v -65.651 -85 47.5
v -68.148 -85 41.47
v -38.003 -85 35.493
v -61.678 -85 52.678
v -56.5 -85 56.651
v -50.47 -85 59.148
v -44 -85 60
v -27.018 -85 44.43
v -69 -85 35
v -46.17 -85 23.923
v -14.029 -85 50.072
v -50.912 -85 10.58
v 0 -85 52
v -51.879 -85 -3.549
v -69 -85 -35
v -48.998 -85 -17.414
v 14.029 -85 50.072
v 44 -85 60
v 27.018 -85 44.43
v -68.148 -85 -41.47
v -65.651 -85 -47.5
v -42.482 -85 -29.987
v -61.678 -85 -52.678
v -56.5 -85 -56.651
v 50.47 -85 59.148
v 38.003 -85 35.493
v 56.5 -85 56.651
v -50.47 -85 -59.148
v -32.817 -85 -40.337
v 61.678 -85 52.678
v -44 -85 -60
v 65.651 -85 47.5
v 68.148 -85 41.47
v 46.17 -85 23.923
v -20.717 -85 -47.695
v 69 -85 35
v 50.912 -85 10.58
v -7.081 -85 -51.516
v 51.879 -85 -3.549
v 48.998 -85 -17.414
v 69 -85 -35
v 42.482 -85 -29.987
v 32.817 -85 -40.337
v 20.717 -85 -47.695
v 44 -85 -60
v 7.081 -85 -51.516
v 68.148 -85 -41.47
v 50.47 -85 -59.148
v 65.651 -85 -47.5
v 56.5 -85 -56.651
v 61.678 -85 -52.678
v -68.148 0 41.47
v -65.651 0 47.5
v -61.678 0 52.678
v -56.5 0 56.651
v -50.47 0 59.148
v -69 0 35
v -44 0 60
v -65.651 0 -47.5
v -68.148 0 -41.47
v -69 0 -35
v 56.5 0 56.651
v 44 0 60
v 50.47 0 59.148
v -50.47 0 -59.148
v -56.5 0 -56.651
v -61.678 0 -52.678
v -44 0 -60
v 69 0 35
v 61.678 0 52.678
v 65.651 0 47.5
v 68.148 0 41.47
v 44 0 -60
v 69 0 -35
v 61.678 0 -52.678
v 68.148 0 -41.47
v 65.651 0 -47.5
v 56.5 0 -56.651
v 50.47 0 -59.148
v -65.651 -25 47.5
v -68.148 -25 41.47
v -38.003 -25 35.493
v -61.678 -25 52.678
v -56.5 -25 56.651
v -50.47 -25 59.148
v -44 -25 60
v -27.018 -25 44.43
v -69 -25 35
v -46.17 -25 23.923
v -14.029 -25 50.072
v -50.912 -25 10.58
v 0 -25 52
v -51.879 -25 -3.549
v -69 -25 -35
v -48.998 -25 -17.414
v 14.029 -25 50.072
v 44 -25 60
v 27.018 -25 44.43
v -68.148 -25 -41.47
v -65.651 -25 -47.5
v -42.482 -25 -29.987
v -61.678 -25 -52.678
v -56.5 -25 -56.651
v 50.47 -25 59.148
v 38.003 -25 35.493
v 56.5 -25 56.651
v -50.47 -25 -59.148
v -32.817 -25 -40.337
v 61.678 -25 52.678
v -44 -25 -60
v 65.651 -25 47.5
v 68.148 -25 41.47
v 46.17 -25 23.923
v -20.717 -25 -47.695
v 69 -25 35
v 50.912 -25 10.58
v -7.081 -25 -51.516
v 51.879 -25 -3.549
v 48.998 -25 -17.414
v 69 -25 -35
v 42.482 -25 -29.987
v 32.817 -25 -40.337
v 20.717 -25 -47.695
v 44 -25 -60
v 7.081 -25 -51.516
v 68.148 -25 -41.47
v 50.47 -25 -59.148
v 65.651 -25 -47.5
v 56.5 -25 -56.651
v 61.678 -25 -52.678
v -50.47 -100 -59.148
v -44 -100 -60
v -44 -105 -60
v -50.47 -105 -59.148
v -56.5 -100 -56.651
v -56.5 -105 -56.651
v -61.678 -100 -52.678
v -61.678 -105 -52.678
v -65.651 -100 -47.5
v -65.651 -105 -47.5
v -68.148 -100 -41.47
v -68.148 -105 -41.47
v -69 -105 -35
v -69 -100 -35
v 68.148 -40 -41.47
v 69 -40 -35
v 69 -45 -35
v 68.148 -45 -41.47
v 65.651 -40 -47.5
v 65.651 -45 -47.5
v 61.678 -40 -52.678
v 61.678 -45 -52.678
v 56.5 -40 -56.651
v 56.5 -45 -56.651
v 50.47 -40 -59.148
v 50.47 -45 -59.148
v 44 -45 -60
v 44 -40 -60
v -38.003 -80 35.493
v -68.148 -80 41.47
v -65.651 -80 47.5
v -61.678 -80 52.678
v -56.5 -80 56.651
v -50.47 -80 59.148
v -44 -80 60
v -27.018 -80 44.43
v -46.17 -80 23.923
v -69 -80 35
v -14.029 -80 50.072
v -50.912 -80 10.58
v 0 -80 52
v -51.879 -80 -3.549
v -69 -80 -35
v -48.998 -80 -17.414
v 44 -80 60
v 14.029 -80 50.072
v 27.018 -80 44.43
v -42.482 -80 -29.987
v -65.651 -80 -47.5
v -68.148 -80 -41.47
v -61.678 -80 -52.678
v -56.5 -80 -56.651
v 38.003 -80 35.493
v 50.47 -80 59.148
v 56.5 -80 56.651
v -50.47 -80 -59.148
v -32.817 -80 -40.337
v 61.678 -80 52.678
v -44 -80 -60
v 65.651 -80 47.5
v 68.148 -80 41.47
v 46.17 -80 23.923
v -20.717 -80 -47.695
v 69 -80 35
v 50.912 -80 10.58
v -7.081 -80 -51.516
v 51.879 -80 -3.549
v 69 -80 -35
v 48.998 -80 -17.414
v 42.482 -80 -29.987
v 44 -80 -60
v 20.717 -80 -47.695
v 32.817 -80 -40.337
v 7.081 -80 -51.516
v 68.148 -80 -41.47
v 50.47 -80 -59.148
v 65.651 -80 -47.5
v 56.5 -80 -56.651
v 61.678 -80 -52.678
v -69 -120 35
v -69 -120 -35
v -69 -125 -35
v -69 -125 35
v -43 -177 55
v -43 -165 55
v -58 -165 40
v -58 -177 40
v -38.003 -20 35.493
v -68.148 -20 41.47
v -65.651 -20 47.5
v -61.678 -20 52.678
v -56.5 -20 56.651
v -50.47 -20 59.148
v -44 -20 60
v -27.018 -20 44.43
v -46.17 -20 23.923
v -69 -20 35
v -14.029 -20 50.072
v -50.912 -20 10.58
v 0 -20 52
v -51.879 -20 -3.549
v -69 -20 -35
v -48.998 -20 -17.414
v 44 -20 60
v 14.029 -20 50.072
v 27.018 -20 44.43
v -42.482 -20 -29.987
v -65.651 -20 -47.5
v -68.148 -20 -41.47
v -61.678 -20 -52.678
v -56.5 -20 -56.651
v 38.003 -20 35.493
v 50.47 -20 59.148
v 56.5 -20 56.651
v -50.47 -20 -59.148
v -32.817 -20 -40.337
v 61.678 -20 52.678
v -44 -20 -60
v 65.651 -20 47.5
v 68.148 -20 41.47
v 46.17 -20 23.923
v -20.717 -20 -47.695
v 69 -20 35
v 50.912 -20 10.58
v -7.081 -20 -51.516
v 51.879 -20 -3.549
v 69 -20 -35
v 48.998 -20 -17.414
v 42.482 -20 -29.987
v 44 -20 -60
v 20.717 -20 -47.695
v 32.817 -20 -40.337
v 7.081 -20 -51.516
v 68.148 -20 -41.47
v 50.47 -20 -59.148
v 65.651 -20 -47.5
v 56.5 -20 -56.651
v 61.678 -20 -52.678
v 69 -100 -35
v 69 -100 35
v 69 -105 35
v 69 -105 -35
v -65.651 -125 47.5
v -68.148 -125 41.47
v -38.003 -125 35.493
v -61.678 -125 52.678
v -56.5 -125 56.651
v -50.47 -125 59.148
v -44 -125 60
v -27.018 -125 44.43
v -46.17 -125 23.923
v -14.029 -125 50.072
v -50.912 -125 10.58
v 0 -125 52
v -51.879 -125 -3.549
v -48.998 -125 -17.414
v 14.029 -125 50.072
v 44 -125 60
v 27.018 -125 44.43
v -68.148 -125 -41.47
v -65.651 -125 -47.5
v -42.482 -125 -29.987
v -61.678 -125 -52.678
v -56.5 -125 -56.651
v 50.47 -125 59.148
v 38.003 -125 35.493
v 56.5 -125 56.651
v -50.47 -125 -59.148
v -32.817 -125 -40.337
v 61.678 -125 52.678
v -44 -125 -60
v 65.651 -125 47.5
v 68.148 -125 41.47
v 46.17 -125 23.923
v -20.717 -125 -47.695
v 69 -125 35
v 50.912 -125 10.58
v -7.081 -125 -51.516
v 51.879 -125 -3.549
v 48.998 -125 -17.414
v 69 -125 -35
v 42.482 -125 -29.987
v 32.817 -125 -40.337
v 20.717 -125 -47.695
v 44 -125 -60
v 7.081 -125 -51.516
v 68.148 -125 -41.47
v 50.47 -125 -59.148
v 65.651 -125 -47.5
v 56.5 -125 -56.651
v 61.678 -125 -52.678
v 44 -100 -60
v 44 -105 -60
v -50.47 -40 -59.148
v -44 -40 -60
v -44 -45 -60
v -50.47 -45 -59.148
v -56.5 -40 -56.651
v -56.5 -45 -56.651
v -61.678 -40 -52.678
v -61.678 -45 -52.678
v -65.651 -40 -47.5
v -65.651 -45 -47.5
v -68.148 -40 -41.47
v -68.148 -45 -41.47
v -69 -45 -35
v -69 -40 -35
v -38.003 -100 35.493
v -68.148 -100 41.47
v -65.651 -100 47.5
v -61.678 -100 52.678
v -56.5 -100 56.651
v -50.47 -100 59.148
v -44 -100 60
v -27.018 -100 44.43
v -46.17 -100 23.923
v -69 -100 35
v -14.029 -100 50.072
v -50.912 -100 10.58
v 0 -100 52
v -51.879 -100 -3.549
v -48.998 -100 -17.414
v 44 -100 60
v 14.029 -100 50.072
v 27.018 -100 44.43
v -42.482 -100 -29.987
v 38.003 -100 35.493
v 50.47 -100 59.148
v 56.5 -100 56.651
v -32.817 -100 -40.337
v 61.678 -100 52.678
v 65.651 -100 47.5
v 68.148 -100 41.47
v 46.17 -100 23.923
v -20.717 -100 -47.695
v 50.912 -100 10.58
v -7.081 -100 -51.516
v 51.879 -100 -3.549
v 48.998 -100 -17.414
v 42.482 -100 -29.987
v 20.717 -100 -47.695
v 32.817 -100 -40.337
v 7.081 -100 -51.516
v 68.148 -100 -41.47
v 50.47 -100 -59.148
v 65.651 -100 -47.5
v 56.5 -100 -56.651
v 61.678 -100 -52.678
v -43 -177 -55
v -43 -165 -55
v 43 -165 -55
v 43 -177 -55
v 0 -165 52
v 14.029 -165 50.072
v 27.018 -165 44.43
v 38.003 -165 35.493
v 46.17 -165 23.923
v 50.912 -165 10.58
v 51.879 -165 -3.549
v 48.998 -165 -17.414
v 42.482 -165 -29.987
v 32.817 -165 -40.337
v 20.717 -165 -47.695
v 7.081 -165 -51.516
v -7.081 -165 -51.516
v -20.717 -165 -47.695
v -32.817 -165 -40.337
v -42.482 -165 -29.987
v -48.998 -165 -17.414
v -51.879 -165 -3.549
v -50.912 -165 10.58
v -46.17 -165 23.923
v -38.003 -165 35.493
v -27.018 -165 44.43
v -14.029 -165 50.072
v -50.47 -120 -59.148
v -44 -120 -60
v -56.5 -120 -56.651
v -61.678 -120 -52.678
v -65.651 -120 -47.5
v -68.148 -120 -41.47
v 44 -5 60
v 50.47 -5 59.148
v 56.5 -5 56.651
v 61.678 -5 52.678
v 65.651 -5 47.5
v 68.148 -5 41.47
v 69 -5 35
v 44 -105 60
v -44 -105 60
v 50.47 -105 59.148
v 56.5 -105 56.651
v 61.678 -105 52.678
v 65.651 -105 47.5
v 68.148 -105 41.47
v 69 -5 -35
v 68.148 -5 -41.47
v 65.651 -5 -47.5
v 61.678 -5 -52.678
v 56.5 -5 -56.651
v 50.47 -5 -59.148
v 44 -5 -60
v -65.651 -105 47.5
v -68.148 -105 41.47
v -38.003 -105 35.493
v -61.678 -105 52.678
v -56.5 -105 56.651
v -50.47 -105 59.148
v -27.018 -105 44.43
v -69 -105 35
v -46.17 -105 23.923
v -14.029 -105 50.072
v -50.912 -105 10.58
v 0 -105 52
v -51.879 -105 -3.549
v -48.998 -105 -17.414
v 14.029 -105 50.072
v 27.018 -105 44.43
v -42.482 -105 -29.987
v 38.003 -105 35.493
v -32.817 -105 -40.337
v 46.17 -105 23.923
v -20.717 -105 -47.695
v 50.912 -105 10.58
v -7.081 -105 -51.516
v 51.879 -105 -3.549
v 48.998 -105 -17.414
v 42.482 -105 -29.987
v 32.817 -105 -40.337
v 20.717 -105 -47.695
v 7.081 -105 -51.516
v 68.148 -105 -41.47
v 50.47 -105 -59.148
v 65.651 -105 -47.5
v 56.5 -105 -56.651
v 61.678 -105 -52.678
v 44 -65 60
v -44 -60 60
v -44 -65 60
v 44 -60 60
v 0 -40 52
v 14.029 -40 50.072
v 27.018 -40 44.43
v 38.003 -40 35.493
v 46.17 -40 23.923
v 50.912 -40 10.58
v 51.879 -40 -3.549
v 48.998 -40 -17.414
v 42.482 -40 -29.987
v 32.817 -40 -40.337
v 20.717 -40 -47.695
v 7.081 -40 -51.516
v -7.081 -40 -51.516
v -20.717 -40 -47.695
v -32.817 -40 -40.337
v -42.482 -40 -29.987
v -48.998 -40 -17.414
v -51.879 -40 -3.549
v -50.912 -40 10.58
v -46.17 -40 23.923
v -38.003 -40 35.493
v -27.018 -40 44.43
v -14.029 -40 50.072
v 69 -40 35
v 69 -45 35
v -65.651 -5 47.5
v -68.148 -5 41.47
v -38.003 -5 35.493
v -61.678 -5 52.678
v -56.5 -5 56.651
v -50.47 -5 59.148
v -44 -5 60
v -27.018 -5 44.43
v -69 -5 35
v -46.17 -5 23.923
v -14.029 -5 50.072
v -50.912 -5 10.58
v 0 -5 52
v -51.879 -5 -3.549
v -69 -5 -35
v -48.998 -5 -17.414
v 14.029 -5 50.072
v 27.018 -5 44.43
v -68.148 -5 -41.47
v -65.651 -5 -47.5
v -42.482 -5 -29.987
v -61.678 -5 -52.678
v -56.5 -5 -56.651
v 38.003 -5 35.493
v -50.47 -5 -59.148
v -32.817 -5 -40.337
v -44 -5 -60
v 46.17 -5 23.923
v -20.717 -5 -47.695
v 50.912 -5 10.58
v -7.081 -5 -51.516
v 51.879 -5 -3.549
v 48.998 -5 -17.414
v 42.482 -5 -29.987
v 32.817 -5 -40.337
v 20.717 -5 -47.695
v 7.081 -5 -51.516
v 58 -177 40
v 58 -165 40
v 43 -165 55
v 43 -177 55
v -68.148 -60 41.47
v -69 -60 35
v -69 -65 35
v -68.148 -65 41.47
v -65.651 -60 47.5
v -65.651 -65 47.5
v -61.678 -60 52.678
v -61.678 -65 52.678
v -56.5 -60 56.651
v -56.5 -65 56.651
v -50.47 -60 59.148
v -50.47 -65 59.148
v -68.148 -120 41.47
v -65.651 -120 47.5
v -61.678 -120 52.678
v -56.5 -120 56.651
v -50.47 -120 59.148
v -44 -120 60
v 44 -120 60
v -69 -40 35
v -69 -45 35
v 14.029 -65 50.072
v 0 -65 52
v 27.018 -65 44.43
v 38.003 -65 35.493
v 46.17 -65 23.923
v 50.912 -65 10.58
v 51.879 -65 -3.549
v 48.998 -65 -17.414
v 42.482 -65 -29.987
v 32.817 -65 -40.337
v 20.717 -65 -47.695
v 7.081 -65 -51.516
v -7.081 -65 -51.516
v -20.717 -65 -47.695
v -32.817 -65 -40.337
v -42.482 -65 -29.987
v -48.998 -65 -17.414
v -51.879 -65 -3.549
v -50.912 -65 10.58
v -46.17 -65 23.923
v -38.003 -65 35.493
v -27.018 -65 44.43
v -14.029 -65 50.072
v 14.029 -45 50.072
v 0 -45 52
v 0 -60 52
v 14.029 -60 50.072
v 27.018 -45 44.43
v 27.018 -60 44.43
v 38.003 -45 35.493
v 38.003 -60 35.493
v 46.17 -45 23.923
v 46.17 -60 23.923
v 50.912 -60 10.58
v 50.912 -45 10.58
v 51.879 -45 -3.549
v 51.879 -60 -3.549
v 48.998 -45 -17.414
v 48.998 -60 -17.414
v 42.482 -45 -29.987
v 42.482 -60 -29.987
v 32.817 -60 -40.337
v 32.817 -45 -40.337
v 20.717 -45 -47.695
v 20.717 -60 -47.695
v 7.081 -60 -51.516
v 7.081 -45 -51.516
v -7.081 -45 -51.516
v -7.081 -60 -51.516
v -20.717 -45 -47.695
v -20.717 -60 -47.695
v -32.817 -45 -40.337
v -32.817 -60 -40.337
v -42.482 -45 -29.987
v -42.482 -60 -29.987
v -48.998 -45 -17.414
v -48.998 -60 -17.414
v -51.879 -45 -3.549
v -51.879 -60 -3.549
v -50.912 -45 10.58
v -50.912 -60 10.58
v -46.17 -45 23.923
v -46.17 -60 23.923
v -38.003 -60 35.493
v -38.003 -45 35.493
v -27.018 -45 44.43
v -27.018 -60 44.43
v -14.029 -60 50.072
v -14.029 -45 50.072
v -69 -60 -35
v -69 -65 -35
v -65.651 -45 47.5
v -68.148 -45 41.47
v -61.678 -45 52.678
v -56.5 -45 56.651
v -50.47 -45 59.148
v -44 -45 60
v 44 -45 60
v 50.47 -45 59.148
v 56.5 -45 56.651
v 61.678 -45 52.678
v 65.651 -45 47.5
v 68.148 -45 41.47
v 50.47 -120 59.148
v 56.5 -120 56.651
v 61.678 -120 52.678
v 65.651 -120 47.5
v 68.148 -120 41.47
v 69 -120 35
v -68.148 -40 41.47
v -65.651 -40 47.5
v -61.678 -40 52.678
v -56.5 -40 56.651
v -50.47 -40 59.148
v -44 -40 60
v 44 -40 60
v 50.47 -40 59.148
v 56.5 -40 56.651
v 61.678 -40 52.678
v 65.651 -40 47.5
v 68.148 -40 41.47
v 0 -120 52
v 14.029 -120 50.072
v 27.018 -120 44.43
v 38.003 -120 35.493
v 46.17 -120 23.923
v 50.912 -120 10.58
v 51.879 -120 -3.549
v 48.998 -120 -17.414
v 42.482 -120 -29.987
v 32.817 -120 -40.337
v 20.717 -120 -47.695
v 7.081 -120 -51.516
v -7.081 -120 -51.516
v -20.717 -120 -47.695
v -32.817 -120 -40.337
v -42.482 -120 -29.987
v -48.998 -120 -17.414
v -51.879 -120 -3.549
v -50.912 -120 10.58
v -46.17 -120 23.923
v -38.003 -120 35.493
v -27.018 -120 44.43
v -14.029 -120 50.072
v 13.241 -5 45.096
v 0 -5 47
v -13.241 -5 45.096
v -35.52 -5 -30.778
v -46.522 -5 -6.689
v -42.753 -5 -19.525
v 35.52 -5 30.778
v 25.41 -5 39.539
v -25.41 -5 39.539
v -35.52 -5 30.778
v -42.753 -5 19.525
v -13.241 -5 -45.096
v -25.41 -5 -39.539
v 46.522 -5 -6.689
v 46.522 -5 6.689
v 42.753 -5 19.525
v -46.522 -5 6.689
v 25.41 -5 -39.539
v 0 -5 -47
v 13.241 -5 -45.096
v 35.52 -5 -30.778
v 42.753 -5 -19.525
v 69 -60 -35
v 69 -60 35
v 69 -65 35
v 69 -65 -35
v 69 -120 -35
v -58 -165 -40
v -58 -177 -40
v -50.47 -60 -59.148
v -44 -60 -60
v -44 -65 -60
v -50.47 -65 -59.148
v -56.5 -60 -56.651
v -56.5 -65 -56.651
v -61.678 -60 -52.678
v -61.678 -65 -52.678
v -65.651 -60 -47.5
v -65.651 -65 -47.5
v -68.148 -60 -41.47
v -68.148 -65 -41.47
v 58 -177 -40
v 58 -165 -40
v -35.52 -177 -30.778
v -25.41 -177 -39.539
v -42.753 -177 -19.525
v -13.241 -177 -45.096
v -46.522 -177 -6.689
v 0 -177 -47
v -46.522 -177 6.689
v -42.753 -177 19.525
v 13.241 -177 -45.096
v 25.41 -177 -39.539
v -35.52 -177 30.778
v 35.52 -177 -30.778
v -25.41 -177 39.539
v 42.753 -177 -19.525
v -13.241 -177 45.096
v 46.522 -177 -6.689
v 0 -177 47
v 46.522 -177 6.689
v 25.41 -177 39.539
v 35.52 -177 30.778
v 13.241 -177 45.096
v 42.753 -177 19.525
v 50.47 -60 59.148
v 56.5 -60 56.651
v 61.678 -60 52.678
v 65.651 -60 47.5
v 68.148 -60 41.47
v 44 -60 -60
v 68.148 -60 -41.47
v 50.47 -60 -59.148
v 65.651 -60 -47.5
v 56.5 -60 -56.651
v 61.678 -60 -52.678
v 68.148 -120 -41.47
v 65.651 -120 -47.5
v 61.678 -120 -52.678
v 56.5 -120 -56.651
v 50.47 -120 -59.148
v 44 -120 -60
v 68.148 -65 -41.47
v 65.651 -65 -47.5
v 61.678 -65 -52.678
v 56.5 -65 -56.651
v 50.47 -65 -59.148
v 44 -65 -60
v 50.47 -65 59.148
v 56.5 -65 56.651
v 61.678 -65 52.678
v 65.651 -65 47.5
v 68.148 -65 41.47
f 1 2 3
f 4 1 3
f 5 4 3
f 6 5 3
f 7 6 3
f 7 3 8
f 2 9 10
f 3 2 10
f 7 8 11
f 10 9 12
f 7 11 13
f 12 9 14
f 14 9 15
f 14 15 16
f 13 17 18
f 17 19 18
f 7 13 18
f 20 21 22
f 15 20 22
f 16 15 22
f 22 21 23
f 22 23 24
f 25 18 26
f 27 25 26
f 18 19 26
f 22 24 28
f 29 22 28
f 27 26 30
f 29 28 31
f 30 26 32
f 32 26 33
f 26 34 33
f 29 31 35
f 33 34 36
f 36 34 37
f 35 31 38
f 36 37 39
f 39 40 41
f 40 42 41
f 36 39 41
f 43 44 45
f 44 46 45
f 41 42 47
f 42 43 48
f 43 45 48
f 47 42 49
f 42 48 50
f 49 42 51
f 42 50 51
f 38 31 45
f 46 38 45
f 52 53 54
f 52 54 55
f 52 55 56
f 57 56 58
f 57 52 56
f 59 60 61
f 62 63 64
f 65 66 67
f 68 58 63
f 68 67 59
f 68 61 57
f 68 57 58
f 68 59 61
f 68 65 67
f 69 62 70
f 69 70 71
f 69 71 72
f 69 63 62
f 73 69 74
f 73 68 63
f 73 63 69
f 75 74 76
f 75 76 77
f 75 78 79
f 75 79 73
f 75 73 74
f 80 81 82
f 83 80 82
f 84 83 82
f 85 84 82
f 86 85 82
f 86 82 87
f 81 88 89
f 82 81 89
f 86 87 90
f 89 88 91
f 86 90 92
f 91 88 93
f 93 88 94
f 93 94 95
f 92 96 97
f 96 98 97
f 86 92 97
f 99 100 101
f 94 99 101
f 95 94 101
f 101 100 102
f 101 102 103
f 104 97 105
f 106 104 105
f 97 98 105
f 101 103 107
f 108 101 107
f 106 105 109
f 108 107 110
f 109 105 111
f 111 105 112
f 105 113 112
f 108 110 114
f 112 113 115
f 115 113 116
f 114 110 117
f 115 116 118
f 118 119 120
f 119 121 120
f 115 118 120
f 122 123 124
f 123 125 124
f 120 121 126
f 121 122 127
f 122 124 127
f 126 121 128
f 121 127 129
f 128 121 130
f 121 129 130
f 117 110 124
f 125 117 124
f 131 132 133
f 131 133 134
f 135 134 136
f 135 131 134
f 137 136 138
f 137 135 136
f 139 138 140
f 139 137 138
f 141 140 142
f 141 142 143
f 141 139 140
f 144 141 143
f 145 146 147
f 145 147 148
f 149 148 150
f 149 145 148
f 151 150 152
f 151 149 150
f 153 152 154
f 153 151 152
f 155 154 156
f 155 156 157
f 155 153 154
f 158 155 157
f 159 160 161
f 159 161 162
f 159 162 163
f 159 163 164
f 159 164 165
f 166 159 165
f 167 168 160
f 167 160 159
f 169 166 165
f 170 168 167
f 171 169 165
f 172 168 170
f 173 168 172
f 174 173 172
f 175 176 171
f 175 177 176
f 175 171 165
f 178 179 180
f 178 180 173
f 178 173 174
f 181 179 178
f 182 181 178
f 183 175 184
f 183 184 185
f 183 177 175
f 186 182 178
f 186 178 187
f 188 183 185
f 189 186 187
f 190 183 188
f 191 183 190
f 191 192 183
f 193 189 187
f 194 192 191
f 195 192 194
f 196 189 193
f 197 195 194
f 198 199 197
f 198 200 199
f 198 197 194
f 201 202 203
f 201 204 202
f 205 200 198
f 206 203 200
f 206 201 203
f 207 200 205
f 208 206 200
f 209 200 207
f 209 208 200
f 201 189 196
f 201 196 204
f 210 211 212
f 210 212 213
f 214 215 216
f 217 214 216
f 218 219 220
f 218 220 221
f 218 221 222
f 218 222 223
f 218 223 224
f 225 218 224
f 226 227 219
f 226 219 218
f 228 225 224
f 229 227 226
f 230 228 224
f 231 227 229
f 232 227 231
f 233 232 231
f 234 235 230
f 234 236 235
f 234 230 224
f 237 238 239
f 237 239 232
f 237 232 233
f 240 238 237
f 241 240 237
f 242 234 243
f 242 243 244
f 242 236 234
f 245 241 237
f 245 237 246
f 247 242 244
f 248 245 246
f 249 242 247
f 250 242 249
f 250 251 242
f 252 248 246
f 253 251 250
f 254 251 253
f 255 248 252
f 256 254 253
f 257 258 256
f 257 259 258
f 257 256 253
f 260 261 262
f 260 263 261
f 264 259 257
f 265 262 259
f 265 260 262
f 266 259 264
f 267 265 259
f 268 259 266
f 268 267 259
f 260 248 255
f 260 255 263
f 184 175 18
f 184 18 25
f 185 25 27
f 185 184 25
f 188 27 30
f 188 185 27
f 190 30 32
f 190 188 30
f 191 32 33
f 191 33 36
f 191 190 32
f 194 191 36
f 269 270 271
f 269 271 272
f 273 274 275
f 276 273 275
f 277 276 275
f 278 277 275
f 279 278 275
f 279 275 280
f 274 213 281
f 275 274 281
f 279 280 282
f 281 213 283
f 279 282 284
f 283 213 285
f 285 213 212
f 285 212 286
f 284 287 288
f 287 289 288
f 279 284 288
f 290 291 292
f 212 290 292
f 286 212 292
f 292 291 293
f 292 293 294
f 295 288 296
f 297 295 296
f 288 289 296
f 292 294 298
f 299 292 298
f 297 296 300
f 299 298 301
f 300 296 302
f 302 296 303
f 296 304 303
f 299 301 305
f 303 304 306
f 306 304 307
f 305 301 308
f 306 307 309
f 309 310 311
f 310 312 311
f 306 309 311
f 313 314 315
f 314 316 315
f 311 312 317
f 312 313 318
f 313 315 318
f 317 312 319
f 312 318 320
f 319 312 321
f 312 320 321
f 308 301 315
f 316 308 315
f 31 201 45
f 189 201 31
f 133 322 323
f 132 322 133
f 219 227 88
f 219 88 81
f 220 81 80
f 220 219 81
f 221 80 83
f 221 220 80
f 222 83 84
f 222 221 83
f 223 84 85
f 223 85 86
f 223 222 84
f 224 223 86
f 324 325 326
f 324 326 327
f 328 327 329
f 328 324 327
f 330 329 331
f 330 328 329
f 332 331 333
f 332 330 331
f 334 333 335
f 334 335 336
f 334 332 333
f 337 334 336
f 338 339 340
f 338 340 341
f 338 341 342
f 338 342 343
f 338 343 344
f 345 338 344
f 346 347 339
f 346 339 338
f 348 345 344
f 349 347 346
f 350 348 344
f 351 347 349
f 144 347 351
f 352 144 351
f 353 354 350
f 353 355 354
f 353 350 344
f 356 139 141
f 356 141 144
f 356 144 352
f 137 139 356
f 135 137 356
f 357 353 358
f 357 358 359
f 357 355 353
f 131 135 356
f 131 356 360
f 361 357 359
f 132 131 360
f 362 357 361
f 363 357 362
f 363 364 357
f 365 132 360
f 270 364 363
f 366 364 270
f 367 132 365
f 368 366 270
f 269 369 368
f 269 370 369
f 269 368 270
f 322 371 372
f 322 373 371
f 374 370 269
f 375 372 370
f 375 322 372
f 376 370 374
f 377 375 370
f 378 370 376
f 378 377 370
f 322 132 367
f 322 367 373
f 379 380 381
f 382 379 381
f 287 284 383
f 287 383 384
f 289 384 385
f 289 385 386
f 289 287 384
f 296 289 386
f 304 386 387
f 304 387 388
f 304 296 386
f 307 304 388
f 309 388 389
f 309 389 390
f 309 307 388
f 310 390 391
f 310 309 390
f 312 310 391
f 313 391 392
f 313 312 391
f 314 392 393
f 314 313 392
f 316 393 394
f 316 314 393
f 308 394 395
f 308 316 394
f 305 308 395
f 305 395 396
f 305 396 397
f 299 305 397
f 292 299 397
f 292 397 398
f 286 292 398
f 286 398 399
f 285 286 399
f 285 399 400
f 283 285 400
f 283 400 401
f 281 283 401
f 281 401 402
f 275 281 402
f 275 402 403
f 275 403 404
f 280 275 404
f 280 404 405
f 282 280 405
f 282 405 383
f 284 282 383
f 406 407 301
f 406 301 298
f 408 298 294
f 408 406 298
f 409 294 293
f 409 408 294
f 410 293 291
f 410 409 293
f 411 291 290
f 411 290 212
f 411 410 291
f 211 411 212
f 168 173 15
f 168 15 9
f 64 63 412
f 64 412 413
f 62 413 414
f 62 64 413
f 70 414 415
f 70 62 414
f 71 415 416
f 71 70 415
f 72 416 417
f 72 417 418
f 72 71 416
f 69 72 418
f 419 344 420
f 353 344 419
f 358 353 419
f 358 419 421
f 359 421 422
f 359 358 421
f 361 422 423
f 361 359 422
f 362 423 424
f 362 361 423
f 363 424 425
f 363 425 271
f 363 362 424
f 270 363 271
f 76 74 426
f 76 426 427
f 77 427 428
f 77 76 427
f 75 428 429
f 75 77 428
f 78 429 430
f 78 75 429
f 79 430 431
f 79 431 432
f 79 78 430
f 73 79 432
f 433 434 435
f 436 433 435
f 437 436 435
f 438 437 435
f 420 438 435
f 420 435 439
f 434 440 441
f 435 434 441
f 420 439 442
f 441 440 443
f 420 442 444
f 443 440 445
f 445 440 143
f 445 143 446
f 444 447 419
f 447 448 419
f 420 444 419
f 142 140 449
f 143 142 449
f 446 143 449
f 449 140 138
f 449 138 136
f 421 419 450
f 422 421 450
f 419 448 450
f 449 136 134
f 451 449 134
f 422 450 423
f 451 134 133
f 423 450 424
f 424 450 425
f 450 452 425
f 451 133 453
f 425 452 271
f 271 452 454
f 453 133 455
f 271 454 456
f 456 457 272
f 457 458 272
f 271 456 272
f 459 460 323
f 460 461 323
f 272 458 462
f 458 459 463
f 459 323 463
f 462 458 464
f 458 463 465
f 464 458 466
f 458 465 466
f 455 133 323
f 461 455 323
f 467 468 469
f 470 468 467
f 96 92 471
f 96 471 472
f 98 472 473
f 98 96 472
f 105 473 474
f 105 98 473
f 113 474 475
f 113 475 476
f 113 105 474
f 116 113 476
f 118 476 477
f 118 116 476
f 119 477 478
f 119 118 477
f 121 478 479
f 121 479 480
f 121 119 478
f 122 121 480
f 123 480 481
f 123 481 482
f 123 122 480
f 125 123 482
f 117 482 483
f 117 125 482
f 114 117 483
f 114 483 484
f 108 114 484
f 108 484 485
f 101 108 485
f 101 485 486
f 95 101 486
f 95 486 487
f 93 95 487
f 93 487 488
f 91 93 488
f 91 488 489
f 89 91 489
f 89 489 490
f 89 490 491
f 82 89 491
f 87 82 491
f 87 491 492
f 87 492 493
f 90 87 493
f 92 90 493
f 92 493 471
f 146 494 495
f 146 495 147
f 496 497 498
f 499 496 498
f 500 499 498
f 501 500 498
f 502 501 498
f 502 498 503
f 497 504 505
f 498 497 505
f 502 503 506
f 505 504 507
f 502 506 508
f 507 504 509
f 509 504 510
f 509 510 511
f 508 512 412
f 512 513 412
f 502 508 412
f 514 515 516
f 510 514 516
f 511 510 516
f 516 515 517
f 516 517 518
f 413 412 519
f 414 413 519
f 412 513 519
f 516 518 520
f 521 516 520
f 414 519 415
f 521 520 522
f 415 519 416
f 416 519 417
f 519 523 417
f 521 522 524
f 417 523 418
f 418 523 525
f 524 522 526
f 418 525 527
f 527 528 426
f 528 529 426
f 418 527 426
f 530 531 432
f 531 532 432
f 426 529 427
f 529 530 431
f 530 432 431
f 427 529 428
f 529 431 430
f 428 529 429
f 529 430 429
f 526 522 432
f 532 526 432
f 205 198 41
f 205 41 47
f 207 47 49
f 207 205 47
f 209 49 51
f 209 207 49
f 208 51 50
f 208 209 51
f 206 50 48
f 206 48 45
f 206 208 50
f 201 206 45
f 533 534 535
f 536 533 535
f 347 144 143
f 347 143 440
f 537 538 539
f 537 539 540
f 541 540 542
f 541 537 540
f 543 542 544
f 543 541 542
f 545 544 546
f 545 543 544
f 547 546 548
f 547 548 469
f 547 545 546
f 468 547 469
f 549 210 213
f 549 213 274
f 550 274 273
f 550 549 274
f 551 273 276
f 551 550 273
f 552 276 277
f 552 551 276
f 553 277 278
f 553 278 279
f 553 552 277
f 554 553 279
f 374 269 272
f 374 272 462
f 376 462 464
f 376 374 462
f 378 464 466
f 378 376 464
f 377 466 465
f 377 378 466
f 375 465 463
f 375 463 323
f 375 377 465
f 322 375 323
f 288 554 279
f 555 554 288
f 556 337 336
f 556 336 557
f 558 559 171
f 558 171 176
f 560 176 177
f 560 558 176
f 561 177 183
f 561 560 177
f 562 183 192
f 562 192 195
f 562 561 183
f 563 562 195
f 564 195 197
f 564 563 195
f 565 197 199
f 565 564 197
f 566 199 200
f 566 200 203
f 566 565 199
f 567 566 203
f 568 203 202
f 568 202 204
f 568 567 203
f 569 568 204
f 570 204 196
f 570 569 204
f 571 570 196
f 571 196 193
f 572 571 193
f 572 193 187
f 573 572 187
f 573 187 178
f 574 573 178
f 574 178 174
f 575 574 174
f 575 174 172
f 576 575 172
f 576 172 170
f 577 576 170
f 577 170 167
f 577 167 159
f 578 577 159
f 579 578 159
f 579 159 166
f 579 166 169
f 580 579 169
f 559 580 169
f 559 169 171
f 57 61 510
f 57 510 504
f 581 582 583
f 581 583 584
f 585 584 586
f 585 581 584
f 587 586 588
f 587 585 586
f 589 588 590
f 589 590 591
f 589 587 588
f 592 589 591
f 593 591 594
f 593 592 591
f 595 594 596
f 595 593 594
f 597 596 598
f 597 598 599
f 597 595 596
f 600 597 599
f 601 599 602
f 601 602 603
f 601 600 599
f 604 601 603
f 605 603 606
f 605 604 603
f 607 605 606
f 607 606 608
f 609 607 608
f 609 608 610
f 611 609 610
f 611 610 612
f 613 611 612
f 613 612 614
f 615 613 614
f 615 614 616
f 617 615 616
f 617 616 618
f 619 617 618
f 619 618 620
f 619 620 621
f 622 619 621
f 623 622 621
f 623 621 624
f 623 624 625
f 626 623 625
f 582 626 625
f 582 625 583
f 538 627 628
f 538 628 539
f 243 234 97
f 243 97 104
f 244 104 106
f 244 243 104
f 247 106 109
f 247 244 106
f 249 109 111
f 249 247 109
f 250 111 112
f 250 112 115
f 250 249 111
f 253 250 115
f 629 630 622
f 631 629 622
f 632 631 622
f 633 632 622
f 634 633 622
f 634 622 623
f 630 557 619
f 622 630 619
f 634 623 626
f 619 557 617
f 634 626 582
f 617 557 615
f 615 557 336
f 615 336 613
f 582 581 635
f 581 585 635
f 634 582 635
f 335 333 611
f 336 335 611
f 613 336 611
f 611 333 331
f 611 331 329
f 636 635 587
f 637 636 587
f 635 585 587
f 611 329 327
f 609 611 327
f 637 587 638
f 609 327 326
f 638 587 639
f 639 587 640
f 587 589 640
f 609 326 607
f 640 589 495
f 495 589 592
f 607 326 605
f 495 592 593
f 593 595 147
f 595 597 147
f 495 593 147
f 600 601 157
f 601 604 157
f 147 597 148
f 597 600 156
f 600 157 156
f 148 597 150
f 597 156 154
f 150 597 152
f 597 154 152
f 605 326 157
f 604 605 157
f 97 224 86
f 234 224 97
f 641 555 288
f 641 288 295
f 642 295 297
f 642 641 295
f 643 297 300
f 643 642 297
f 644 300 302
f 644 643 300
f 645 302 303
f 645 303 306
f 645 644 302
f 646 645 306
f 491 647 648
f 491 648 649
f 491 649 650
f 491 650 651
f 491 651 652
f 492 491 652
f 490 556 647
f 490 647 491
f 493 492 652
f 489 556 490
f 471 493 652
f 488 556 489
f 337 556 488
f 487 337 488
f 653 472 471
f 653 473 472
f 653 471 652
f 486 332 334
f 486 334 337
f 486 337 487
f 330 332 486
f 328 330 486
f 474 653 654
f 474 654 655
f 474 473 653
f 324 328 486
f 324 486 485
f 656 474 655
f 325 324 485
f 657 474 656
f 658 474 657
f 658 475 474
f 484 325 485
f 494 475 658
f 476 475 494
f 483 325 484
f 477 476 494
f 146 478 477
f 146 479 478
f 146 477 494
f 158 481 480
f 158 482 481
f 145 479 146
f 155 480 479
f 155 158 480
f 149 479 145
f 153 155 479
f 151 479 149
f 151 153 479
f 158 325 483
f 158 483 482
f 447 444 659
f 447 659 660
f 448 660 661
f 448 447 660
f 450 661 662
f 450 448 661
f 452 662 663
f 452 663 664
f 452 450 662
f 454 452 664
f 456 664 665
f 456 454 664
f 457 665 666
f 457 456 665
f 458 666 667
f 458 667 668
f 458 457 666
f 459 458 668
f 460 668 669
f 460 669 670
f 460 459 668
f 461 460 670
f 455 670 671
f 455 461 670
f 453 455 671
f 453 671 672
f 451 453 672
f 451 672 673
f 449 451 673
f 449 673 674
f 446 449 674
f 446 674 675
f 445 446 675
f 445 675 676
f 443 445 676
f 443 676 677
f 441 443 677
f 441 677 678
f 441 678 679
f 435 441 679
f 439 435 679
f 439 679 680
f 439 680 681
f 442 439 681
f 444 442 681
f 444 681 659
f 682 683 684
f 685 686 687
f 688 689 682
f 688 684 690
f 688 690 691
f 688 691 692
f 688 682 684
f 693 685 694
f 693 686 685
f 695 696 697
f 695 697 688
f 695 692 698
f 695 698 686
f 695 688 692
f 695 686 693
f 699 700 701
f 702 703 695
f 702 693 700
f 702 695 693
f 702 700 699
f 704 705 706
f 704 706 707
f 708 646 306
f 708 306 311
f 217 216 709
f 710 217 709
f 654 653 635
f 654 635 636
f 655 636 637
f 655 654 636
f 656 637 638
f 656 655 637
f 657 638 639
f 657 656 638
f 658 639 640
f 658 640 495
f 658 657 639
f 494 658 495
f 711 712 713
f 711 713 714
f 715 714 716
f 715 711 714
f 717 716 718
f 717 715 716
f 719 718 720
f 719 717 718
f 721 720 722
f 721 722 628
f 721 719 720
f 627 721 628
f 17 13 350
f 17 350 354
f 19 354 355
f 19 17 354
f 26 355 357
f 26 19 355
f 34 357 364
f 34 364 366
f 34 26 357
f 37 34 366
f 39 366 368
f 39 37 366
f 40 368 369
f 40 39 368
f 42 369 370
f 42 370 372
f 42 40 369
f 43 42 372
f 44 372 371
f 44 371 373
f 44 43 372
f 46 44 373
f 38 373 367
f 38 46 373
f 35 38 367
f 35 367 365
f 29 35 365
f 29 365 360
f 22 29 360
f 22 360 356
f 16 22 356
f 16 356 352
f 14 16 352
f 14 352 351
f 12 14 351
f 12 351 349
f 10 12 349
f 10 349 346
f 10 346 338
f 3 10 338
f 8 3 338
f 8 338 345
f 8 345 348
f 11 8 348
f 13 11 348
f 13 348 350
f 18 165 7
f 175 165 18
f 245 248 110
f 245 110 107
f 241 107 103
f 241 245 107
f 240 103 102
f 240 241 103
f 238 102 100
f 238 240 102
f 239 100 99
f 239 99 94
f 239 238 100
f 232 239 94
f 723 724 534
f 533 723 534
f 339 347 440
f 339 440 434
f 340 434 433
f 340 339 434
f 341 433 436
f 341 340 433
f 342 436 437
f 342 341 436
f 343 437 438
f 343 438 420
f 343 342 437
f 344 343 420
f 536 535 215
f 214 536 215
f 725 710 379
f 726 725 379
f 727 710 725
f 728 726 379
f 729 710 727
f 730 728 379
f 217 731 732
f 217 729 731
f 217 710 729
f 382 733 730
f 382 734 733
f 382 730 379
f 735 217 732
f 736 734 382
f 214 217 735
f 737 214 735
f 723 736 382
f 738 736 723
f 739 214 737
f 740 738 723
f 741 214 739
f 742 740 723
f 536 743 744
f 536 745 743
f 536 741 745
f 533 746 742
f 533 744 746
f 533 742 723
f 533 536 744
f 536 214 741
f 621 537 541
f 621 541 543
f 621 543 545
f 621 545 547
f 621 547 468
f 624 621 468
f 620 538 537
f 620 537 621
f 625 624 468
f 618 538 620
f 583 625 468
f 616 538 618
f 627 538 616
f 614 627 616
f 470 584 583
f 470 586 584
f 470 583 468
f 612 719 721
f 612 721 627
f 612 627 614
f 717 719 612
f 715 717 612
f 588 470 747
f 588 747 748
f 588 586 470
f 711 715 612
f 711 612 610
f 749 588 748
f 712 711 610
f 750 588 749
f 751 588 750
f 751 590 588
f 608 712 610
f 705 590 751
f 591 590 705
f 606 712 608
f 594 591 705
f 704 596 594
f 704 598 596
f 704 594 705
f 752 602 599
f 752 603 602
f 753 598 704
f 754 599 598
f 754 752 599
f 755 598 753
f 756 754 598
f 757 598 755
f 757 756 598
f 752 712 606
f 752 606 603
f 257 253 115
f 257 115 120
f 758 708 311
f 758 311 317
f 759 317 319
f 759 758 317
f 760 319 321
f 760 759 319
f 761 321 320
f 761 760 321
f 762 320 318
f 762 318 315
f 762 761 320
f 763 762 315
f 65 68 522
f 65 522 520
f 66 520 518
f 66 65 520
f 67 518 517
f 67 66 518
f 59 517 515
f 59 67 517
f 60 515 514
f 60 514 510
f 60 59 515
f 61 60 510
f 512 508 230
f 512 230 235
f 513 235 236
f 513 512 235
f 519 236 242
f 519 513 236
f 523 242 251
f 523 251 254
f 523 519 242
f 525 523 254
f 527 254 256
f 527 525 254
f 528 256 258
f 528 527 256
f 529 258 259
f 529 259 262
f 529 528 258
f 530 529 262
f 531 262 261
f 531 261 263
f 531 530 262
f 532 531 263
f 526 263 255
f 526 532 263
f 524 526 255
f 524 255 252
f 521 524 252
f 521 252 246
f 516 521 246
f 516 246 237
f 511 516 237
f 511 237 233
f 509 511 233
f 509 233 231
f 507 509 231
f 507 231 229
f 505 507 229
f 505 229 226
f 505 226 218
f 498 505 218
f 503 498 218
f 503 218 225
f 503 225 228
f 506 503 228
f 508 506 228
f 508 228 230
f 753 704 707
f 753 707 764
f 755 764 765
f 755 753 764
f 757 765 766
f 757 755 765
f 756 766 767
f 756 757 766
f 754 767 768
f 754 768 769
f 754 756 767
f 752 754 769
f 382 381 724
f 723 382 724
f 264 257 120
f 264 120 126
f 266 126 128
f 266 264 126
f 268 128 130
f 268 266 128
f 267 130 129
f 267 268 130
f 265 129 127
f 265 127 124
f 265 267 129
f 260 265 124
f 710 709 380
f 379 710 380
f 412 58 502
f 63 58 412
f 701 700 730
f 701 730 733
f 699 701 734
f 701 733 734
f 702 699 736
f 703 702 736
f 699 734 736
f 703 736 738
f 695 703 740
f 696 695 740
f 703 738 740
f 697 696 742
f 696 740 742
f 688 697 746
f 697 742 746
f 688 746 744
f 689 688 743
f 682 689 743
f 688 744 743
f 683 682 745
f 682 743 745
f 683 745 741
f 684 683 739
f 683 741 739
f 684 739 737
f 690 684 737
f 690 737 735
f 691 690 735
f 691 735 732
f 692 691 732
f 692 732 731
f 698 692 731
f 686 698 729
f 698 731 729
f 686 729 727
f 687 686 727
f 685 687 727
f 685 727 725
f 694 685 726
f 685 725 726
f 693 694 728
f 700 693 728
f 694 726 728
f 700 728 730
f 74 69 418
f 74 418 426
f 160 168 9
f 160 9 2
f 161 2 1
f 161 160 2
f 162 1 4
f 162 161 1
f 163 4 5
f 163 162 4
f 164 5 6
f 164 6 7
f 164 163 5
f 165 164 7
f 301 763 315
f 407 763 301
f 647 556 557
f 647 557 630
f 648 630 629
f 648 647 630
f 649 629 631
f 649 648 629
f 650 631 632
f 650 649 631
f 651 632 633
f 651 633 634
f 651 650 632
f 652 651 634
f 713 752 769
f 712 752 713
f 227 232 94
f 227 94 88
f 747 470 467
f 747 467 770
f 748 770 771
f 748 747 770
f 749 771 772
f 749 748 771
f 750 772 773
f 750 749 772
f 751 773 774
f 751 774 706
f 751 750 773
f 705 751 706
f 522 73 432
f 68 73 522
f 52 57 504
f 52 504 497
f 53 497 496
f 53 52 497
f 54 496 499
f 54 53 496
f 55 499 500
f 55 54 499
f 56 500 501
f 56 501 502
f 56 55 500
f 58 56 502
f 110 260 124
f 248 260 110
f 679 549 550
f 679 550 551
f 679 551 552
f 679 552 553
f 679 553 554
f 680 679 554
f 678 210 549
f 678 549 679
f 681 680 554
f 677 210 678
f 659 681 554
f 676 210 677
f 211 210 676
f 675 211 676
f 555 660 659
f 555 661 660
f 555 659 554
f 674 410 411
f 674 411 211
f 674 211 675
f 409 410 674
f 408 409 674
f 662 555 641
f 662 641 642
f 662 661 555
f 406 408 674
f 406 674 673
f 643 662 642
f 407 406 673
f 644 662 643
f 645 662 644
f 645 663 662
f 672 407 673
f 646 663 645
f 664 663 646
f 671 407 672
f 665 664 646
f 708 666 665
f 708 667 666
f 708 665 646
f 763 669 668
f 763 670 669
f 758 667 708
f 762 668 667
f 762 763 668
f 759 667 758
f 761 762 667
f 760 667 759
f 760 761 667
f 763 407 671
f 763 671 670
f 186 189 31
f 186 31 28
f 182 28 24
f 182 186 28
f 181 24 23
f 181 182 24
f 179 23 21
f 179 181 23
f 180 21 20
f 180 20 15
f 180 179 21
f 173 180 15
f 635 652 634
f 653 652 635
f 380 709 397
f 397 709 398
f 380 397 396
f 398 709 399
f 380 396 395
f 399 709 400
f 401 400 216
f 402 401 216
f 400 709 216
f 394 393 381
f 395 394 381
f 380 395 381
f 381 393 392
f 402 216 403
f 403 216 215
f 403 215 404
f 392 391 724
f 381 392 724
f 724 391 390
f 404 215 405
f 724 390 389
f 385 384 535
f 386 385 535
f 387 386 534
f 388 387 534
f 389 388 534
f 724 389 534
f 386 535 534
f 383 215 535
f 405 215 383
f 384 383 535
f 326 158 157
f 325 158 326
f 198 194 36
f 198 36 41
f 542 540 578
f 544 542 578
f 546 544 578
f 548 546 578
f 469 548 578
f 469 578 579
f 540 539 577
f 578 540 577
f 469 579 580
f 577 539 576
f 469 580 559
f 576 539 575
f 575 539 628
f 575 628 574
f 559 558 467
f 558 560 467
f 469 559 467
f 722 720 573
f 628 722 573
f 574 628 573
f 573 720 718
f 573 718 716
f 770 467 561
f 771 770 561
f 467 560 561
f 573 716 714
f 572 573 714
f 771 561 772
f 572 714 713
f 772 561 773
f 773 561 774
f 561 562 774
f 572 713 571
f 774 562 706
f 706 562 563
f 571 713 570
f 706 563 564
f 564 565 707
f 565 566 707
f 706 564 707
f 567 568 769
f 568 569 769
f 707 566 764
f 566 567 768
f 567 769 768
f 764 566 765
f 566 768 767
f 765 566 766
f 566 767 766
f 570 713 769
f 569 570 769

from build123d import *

# Parameters (mm, degrees)
SKETCH1_R           = 52
BOSS_EXTRUDE1_DEPTH = 165
BOSS_EXTRUDE2_DEPTH = 5
LPATTERN1_COUNT     = 7
LPATTERN1_PITCH     = 20
BOSS_EXTRUDE3_DEPTH = 12
SKETCH4_R           = 47
CUT_EXTRUDE1_DEPTH  = 172


with BuildPart() as part:
    # Sketch1 → Boss-Extrude1 (new body)
    with BuildSketch(Plane(origin=(0, 0, 0), x_dir=(1, 0, 0), z_dir=(0, 1, 0))):
        with Locations(Location((0, 0, 0), (0, 0, 270))):
            Circle(SKETCH1_R)
    extrude(amount=-BOSS_EXTRUDE1_DEPTH)

    # Sketch2 → Boss-Extrude2 (add)
    with BuildSketch(Plane(origin=(0, 0, 0), x_dir=(1, 0, 0), z_dir=(0, 1, 0))):
        with BuildLine():
            Line((-44, -60), (44, -60))
            ThreePointArc((44, -60), (61.67766953, -52.67766953), (69, -35))
            Line((69, -35), (69, 35))
            ThreePointArc((69, 35), (61.67766953, 52.67766953), (44, 60))
            Line((44, 60), (-44, 60))
            ThreePointArc((-44, 60), (-61.67766953, 52.67766953), (-69, 35))
            Line((-69, 35), (-69, -35))
            ThreePointArc((-69, -35), (-61.67766953, -52.67766953), (-44, -60))
        make_face()
    boss_extrude2 = extrude(amount=-BOSS_EXTRUDE2_DEPTH)

    # LPattern1: Boss-Extrude2 ×7
    with Locations(*[(0, -i * LPATTERN1_PITCH, 0) for i in range(1, LPATTERN1_COUNT)]):
        add(boss_extrude2)

    # Sketch3 → Boss-Extrude3 (add)
    with BuildSketch(Plane.XZ.offset(165)):
        Polygon((-43, 55), (-58, 40), (-58, -40), (-43, -55), (43, -55), (58, -40), (58, 40), (43, 55), align=None)
    extrude(amount=BOSS_EXTRUDE3_DEPTH)

    # Sketch4 → Cut-Extrude1 (cut)
    with BuildSketch(Plane.XZ.offset(177)):
        with Locations(Location((0, 0, 0), (0, 0, 270))):
            Circle(SKETCH4_R)
    extrude(amount=-CUT_EXTRUDE1_DEPTH, mode=Mode.SUBTRACT)


solid = part.part
